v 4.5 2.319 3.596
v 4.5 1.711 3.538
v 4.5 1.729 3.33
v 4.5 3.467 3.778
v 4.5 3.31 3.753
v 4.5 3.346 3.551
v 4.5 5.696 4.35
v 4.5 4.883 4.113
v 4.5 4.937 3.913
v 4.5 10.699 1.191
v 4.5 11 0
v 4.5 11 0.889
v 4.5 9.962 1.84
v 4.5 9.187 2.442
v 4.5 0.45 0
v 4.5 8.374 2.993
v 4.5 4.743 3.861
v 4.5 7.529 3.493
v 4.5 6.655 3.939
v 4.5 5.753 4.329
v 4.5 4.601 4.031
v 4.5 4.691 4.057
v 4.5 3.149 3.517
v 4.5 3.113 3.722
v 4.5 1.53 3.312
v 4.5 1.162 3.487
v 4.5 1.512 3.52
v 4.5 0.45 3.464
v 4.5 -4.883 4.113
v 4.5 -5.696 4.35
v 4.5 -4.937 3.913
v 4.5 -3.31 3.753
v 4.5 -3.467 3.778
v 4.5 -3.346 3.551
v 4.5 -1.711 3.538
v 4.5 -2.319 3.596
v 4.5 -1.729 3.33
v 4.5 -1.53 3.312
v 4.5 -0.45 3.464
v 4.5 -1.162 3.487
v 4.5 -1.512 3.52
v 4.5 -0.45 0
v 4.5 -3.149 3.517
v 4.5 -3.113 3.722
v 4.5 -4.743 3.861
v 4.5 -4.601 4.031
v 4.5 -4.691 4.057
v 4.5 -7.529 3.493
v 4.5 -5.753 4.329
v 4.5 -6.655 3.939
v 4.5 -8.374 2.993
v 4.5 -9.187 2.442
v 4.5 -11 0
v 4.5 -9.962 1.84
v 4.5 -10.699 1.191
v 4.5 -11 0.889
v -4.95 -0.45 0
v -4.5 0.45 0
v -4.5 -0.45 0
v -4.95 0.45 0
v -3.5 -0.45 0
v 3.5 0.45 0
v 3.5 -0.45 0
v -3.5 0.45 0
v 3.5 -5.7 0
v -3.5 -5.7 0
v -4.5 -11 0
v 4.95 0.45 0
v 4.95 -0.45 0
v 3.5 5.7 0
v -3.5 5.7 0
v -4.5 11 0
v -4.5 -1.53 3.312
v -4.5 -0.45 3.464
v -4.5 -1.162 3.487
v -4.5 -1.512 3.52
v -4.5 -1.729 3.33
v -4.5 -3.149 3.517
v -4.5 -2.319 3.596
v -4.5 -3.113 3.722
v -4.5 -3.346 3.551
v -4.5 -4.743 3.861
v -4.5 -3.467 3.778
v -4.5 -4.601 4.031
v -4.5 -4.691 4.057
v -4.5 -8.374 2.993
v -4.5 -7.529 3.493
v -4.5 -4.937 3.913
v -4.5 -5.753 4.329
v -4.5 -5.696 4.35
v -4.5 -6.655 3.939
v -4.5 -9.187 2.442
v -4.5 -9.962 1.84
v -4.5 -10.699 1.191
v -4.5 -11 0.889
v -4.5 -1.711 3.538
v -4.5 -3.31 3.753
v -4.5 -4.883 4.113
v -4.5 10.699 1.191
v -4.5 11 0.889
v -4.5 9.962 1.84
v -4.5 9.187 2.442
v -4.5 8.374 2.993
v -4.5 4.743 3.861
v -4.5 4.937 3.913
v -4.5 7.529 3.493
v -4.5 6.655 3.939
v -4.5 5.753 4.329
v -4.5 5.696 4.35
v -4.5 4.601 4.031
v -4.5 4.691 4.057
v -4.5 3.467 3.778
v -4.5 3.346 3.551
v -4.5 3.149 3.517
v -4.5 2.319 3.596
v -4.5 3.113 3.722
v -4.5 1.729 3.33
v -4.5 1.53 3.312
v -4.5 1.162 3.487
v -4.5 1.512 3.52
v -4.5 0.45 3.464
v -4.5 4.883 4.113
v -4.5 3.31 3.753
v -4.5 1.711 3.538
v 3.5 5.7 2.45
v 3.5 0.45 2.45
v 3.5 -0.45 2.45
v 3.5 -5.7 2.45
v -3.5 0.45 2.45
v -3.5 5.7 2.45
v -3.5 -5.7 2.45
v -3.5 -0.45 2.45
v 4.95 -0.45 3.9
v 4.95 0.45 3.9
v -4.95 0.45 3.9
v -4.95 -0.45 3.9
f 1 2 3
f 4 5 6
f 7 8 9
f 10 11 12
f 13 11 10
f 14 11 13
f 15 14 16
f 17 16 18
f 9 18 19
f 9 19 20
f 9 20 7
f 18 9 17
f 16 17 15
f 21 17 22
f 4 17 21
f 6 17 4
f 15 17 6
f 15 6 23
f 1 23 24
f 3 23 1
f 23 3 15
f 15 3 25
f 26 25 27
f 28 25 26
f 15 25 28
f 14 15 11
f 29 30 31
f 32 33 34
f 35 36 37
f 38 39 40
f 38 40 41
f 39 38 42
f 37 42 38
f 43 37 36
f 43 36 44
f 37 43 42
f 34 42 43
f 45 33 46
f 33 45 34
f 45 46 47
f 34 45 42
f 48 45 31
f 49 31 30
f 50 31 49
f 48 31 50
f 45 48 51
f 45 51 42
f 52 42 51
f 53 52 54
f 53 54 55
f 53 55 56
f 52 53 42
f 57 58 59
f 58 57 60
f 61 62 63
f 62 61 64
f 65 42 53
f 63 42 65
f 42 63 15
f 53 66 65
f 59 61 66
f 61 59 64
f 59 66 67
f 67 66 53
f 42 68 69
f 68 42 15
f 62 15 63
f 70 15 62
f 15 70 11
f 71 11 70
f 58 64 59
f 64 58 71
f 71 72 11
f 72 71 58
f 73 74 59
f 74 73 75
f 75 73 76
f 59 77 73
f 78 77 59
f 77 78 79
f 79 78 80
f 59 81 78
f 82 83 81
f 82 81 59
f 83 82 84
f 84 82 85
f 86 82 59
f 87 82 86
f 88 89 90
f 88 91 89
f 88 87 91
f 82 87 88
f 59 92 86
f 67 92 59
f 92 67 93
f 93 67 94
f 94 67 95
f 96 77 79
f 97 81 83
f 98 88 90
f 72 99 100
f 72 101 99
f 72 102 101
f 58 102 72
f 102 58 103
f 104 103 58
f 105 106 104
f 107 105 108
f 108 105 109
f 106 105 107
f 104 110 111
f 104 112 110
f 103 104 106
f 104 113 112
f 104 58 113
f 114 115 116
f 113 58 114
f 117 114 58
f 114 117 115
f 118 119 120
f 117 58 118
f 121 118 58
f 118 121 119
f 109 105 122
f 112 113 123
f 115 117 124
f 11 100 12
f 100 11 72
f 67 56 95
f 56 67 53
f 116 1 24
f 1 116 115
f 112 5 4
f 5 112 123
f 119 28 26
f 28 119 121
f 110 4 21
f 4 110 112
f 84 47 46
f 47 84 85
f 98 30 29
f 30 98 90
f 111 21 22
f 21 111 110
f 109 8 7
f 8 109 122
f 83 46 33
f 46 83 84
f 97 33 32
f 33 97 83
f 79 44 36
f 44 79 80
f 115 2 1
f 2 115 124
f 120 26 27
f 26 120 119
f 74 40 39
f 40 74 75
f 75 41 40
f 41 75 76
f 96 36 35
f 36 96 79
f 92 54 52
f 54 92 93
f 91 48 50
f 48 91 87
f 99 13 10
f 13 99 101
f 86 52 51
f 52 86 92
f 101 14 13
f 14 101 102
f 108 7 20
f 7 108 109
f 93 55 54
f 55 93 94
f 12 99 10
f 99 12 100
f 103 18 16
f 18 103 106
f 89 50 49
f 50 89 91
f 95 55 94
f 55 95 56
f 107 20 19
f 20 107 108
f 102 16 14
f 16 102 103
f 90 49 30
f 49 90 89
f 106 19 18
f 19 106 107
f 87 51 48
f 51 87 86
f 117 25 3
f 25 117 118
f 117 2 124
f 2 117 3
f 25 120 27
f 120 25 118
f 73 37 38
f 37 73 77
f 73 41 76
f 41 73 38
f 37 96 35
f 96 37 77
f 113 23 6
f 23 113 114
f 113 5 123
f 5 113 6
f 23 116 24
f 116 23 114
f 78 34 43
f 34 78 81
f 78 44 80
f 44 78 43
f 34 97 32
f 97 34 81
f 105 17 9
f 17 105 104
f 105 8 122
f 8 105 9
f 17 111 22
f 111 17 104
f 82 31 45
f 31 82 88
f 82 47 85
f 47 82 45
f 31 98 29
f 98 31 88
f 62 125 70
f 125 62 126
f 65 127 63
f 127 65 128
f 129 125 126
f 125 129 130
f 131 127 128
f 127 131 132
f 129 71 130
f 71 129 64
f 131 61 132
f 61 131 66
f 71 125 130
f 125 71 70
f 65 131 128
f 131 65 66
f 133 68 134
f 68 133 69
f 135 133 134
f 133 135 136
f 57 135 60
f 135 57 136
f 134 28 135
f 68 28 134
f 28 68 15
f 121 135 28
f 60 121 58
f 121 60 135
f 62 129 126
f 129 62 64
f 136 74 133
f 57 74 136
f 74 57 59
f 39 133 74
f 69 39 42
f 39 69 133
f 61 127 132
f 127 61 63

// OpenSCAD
slider_w = 2;
slider_l = 5;
fader_w = 9;
fader_l = 22;
fader_hmax = 4.35;
centerline_l = 9.9;
centerline_w = 0.9;
centerline_h = 3.9;
outer_curve_l = 5.30;
outer_curve_base = 0.9;
outer_curve_h = fader_hmax - outer_curve_base;
fader_hmin = 3.45;
ridge_w = 0.2;
ridge_d = 0.2;
outer_wall = 1;

inner_curve_l = fader_l - 2*outer_curve_l;
inner_curve_h = fader_hmax-fader_hmin;
inner_curve_r = (pow(inner_curve_l/2, 2) + pow(inner_curve_h, 2))/(2*inner_curve_h);
outer_curve_z = (pow(fader_l/2, 2) - pow(inner_curve_l/2, 2) - pow(outer_curve_h, 2))/outer_curve_h/2;
outer_curve_r = sqrt(pow(fader_l/2, 2) + pow(outer_curve_z, 2));

// basic curve
module base() {
    intersection() {
        difference() {
            translate([0, 0, fader_hmax/2]) cube([fader_w, fader_l, fader_hmax], center=true);
            translate([0, 0, fader_hmin+inner_curve_r]) rotate([0, 90, 0]) cylinder(h=fader_w+1, r=inner_curve_r, center=true, $fn=100);
        }
        translate([0, 0, outer_curve_base-outer_curve_z]) rotate([0, 90, 0])
            cylinder(h=fader_w+1, r=outer_curve_r, center=true, $fn=100);
    }
}

module ridge() {
    cube([fader_w, ridge_w, ridge_d*2], center=true);
}

// add texture
module textured() {
    difference() {
        base();
        for(a=[5,10,15,20]) {
            translate([0, 0, fader_hmin+inner_curve_r])
                rotate([a, 0, 0]) translate([0, 0, -inner_curve_r])
                ridge();
            translate([0, 0, fader_hmin+inner_curve_r])
                rotate([-a, 0, 0]) translate([0, 0, -inner_curve_r])
                ridge();
        }
    }

}

module cutout() {
    cube([fader_w-2*outer_wall, inner_curve_l, 2*(fader_hmin-outer_wall)], center=true);
}
difference() {
    textured();
    cutout();
}
translate([0, 0, centerline_h/2])
    cube([centerline_l, centerline_w, centerline_h], center=true);
